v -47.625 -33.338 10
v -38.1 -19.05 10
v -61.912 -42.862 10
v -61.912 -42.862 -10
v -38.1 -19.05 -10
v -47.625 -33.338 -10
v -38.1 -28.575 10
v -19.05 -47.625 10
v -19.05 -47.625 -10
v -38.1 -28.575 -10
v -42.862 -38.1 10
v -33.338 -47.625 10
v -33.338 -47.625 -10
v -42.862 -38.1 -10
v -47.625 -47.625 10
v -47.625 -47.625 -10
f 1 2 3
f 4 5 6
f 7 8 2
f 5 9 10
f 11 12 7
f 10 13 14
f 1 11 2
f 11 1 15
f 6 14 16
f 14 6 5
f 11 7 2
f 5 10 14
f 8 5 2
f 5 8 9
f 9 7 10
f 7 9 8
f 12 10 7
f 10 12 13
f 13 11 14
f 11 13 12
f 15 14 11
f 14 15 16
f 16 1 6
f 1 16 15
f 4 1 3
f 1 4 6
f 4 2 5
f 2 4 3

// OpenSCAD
polyhedron(
    points=[
    [-38.1, -19.05, 10],
    [-19.05, -47.625, 10],
    [-38.1, -28.575, 10],
    [-33.3375, -47.625, 10],
    [-42.8625, -38.1, 10],
    [-47.625, -47.625, 10],
    [-47.625, -33.3375, 10],
    [-61.9125, -42.8625, 10],
    [-38.1, -19.05, -10],
    [-19.05, -47.625, -10],
    [-38.1, -28.575, -10],
    [-33.3375, -47.625, -10],
    [-42.8625, -38.1, -10],
    [-47.625, -47.625, -10],
    [-47.625, -33.3375, -10],
    [-61.9125, -42.8625, -10],
    ],
    faces=[
        [7,0,6],
        [14,8,15],
        [0,1,2],
        [10,9,8],
        [2,3,4],
        [12,11,10],
        [6,0,4,5],
        [13,12,8,14],
        [0,2,4],
        [12,10,8],
        [0,8,9,1],
        [1,9,10,2],
        [2,10,11,3],
        [3,11,12,4],
        [4,12,13,5],
        [5,13,14,6],
        [6,14,15,7],
        [7,15,8,0],
    ]
);
